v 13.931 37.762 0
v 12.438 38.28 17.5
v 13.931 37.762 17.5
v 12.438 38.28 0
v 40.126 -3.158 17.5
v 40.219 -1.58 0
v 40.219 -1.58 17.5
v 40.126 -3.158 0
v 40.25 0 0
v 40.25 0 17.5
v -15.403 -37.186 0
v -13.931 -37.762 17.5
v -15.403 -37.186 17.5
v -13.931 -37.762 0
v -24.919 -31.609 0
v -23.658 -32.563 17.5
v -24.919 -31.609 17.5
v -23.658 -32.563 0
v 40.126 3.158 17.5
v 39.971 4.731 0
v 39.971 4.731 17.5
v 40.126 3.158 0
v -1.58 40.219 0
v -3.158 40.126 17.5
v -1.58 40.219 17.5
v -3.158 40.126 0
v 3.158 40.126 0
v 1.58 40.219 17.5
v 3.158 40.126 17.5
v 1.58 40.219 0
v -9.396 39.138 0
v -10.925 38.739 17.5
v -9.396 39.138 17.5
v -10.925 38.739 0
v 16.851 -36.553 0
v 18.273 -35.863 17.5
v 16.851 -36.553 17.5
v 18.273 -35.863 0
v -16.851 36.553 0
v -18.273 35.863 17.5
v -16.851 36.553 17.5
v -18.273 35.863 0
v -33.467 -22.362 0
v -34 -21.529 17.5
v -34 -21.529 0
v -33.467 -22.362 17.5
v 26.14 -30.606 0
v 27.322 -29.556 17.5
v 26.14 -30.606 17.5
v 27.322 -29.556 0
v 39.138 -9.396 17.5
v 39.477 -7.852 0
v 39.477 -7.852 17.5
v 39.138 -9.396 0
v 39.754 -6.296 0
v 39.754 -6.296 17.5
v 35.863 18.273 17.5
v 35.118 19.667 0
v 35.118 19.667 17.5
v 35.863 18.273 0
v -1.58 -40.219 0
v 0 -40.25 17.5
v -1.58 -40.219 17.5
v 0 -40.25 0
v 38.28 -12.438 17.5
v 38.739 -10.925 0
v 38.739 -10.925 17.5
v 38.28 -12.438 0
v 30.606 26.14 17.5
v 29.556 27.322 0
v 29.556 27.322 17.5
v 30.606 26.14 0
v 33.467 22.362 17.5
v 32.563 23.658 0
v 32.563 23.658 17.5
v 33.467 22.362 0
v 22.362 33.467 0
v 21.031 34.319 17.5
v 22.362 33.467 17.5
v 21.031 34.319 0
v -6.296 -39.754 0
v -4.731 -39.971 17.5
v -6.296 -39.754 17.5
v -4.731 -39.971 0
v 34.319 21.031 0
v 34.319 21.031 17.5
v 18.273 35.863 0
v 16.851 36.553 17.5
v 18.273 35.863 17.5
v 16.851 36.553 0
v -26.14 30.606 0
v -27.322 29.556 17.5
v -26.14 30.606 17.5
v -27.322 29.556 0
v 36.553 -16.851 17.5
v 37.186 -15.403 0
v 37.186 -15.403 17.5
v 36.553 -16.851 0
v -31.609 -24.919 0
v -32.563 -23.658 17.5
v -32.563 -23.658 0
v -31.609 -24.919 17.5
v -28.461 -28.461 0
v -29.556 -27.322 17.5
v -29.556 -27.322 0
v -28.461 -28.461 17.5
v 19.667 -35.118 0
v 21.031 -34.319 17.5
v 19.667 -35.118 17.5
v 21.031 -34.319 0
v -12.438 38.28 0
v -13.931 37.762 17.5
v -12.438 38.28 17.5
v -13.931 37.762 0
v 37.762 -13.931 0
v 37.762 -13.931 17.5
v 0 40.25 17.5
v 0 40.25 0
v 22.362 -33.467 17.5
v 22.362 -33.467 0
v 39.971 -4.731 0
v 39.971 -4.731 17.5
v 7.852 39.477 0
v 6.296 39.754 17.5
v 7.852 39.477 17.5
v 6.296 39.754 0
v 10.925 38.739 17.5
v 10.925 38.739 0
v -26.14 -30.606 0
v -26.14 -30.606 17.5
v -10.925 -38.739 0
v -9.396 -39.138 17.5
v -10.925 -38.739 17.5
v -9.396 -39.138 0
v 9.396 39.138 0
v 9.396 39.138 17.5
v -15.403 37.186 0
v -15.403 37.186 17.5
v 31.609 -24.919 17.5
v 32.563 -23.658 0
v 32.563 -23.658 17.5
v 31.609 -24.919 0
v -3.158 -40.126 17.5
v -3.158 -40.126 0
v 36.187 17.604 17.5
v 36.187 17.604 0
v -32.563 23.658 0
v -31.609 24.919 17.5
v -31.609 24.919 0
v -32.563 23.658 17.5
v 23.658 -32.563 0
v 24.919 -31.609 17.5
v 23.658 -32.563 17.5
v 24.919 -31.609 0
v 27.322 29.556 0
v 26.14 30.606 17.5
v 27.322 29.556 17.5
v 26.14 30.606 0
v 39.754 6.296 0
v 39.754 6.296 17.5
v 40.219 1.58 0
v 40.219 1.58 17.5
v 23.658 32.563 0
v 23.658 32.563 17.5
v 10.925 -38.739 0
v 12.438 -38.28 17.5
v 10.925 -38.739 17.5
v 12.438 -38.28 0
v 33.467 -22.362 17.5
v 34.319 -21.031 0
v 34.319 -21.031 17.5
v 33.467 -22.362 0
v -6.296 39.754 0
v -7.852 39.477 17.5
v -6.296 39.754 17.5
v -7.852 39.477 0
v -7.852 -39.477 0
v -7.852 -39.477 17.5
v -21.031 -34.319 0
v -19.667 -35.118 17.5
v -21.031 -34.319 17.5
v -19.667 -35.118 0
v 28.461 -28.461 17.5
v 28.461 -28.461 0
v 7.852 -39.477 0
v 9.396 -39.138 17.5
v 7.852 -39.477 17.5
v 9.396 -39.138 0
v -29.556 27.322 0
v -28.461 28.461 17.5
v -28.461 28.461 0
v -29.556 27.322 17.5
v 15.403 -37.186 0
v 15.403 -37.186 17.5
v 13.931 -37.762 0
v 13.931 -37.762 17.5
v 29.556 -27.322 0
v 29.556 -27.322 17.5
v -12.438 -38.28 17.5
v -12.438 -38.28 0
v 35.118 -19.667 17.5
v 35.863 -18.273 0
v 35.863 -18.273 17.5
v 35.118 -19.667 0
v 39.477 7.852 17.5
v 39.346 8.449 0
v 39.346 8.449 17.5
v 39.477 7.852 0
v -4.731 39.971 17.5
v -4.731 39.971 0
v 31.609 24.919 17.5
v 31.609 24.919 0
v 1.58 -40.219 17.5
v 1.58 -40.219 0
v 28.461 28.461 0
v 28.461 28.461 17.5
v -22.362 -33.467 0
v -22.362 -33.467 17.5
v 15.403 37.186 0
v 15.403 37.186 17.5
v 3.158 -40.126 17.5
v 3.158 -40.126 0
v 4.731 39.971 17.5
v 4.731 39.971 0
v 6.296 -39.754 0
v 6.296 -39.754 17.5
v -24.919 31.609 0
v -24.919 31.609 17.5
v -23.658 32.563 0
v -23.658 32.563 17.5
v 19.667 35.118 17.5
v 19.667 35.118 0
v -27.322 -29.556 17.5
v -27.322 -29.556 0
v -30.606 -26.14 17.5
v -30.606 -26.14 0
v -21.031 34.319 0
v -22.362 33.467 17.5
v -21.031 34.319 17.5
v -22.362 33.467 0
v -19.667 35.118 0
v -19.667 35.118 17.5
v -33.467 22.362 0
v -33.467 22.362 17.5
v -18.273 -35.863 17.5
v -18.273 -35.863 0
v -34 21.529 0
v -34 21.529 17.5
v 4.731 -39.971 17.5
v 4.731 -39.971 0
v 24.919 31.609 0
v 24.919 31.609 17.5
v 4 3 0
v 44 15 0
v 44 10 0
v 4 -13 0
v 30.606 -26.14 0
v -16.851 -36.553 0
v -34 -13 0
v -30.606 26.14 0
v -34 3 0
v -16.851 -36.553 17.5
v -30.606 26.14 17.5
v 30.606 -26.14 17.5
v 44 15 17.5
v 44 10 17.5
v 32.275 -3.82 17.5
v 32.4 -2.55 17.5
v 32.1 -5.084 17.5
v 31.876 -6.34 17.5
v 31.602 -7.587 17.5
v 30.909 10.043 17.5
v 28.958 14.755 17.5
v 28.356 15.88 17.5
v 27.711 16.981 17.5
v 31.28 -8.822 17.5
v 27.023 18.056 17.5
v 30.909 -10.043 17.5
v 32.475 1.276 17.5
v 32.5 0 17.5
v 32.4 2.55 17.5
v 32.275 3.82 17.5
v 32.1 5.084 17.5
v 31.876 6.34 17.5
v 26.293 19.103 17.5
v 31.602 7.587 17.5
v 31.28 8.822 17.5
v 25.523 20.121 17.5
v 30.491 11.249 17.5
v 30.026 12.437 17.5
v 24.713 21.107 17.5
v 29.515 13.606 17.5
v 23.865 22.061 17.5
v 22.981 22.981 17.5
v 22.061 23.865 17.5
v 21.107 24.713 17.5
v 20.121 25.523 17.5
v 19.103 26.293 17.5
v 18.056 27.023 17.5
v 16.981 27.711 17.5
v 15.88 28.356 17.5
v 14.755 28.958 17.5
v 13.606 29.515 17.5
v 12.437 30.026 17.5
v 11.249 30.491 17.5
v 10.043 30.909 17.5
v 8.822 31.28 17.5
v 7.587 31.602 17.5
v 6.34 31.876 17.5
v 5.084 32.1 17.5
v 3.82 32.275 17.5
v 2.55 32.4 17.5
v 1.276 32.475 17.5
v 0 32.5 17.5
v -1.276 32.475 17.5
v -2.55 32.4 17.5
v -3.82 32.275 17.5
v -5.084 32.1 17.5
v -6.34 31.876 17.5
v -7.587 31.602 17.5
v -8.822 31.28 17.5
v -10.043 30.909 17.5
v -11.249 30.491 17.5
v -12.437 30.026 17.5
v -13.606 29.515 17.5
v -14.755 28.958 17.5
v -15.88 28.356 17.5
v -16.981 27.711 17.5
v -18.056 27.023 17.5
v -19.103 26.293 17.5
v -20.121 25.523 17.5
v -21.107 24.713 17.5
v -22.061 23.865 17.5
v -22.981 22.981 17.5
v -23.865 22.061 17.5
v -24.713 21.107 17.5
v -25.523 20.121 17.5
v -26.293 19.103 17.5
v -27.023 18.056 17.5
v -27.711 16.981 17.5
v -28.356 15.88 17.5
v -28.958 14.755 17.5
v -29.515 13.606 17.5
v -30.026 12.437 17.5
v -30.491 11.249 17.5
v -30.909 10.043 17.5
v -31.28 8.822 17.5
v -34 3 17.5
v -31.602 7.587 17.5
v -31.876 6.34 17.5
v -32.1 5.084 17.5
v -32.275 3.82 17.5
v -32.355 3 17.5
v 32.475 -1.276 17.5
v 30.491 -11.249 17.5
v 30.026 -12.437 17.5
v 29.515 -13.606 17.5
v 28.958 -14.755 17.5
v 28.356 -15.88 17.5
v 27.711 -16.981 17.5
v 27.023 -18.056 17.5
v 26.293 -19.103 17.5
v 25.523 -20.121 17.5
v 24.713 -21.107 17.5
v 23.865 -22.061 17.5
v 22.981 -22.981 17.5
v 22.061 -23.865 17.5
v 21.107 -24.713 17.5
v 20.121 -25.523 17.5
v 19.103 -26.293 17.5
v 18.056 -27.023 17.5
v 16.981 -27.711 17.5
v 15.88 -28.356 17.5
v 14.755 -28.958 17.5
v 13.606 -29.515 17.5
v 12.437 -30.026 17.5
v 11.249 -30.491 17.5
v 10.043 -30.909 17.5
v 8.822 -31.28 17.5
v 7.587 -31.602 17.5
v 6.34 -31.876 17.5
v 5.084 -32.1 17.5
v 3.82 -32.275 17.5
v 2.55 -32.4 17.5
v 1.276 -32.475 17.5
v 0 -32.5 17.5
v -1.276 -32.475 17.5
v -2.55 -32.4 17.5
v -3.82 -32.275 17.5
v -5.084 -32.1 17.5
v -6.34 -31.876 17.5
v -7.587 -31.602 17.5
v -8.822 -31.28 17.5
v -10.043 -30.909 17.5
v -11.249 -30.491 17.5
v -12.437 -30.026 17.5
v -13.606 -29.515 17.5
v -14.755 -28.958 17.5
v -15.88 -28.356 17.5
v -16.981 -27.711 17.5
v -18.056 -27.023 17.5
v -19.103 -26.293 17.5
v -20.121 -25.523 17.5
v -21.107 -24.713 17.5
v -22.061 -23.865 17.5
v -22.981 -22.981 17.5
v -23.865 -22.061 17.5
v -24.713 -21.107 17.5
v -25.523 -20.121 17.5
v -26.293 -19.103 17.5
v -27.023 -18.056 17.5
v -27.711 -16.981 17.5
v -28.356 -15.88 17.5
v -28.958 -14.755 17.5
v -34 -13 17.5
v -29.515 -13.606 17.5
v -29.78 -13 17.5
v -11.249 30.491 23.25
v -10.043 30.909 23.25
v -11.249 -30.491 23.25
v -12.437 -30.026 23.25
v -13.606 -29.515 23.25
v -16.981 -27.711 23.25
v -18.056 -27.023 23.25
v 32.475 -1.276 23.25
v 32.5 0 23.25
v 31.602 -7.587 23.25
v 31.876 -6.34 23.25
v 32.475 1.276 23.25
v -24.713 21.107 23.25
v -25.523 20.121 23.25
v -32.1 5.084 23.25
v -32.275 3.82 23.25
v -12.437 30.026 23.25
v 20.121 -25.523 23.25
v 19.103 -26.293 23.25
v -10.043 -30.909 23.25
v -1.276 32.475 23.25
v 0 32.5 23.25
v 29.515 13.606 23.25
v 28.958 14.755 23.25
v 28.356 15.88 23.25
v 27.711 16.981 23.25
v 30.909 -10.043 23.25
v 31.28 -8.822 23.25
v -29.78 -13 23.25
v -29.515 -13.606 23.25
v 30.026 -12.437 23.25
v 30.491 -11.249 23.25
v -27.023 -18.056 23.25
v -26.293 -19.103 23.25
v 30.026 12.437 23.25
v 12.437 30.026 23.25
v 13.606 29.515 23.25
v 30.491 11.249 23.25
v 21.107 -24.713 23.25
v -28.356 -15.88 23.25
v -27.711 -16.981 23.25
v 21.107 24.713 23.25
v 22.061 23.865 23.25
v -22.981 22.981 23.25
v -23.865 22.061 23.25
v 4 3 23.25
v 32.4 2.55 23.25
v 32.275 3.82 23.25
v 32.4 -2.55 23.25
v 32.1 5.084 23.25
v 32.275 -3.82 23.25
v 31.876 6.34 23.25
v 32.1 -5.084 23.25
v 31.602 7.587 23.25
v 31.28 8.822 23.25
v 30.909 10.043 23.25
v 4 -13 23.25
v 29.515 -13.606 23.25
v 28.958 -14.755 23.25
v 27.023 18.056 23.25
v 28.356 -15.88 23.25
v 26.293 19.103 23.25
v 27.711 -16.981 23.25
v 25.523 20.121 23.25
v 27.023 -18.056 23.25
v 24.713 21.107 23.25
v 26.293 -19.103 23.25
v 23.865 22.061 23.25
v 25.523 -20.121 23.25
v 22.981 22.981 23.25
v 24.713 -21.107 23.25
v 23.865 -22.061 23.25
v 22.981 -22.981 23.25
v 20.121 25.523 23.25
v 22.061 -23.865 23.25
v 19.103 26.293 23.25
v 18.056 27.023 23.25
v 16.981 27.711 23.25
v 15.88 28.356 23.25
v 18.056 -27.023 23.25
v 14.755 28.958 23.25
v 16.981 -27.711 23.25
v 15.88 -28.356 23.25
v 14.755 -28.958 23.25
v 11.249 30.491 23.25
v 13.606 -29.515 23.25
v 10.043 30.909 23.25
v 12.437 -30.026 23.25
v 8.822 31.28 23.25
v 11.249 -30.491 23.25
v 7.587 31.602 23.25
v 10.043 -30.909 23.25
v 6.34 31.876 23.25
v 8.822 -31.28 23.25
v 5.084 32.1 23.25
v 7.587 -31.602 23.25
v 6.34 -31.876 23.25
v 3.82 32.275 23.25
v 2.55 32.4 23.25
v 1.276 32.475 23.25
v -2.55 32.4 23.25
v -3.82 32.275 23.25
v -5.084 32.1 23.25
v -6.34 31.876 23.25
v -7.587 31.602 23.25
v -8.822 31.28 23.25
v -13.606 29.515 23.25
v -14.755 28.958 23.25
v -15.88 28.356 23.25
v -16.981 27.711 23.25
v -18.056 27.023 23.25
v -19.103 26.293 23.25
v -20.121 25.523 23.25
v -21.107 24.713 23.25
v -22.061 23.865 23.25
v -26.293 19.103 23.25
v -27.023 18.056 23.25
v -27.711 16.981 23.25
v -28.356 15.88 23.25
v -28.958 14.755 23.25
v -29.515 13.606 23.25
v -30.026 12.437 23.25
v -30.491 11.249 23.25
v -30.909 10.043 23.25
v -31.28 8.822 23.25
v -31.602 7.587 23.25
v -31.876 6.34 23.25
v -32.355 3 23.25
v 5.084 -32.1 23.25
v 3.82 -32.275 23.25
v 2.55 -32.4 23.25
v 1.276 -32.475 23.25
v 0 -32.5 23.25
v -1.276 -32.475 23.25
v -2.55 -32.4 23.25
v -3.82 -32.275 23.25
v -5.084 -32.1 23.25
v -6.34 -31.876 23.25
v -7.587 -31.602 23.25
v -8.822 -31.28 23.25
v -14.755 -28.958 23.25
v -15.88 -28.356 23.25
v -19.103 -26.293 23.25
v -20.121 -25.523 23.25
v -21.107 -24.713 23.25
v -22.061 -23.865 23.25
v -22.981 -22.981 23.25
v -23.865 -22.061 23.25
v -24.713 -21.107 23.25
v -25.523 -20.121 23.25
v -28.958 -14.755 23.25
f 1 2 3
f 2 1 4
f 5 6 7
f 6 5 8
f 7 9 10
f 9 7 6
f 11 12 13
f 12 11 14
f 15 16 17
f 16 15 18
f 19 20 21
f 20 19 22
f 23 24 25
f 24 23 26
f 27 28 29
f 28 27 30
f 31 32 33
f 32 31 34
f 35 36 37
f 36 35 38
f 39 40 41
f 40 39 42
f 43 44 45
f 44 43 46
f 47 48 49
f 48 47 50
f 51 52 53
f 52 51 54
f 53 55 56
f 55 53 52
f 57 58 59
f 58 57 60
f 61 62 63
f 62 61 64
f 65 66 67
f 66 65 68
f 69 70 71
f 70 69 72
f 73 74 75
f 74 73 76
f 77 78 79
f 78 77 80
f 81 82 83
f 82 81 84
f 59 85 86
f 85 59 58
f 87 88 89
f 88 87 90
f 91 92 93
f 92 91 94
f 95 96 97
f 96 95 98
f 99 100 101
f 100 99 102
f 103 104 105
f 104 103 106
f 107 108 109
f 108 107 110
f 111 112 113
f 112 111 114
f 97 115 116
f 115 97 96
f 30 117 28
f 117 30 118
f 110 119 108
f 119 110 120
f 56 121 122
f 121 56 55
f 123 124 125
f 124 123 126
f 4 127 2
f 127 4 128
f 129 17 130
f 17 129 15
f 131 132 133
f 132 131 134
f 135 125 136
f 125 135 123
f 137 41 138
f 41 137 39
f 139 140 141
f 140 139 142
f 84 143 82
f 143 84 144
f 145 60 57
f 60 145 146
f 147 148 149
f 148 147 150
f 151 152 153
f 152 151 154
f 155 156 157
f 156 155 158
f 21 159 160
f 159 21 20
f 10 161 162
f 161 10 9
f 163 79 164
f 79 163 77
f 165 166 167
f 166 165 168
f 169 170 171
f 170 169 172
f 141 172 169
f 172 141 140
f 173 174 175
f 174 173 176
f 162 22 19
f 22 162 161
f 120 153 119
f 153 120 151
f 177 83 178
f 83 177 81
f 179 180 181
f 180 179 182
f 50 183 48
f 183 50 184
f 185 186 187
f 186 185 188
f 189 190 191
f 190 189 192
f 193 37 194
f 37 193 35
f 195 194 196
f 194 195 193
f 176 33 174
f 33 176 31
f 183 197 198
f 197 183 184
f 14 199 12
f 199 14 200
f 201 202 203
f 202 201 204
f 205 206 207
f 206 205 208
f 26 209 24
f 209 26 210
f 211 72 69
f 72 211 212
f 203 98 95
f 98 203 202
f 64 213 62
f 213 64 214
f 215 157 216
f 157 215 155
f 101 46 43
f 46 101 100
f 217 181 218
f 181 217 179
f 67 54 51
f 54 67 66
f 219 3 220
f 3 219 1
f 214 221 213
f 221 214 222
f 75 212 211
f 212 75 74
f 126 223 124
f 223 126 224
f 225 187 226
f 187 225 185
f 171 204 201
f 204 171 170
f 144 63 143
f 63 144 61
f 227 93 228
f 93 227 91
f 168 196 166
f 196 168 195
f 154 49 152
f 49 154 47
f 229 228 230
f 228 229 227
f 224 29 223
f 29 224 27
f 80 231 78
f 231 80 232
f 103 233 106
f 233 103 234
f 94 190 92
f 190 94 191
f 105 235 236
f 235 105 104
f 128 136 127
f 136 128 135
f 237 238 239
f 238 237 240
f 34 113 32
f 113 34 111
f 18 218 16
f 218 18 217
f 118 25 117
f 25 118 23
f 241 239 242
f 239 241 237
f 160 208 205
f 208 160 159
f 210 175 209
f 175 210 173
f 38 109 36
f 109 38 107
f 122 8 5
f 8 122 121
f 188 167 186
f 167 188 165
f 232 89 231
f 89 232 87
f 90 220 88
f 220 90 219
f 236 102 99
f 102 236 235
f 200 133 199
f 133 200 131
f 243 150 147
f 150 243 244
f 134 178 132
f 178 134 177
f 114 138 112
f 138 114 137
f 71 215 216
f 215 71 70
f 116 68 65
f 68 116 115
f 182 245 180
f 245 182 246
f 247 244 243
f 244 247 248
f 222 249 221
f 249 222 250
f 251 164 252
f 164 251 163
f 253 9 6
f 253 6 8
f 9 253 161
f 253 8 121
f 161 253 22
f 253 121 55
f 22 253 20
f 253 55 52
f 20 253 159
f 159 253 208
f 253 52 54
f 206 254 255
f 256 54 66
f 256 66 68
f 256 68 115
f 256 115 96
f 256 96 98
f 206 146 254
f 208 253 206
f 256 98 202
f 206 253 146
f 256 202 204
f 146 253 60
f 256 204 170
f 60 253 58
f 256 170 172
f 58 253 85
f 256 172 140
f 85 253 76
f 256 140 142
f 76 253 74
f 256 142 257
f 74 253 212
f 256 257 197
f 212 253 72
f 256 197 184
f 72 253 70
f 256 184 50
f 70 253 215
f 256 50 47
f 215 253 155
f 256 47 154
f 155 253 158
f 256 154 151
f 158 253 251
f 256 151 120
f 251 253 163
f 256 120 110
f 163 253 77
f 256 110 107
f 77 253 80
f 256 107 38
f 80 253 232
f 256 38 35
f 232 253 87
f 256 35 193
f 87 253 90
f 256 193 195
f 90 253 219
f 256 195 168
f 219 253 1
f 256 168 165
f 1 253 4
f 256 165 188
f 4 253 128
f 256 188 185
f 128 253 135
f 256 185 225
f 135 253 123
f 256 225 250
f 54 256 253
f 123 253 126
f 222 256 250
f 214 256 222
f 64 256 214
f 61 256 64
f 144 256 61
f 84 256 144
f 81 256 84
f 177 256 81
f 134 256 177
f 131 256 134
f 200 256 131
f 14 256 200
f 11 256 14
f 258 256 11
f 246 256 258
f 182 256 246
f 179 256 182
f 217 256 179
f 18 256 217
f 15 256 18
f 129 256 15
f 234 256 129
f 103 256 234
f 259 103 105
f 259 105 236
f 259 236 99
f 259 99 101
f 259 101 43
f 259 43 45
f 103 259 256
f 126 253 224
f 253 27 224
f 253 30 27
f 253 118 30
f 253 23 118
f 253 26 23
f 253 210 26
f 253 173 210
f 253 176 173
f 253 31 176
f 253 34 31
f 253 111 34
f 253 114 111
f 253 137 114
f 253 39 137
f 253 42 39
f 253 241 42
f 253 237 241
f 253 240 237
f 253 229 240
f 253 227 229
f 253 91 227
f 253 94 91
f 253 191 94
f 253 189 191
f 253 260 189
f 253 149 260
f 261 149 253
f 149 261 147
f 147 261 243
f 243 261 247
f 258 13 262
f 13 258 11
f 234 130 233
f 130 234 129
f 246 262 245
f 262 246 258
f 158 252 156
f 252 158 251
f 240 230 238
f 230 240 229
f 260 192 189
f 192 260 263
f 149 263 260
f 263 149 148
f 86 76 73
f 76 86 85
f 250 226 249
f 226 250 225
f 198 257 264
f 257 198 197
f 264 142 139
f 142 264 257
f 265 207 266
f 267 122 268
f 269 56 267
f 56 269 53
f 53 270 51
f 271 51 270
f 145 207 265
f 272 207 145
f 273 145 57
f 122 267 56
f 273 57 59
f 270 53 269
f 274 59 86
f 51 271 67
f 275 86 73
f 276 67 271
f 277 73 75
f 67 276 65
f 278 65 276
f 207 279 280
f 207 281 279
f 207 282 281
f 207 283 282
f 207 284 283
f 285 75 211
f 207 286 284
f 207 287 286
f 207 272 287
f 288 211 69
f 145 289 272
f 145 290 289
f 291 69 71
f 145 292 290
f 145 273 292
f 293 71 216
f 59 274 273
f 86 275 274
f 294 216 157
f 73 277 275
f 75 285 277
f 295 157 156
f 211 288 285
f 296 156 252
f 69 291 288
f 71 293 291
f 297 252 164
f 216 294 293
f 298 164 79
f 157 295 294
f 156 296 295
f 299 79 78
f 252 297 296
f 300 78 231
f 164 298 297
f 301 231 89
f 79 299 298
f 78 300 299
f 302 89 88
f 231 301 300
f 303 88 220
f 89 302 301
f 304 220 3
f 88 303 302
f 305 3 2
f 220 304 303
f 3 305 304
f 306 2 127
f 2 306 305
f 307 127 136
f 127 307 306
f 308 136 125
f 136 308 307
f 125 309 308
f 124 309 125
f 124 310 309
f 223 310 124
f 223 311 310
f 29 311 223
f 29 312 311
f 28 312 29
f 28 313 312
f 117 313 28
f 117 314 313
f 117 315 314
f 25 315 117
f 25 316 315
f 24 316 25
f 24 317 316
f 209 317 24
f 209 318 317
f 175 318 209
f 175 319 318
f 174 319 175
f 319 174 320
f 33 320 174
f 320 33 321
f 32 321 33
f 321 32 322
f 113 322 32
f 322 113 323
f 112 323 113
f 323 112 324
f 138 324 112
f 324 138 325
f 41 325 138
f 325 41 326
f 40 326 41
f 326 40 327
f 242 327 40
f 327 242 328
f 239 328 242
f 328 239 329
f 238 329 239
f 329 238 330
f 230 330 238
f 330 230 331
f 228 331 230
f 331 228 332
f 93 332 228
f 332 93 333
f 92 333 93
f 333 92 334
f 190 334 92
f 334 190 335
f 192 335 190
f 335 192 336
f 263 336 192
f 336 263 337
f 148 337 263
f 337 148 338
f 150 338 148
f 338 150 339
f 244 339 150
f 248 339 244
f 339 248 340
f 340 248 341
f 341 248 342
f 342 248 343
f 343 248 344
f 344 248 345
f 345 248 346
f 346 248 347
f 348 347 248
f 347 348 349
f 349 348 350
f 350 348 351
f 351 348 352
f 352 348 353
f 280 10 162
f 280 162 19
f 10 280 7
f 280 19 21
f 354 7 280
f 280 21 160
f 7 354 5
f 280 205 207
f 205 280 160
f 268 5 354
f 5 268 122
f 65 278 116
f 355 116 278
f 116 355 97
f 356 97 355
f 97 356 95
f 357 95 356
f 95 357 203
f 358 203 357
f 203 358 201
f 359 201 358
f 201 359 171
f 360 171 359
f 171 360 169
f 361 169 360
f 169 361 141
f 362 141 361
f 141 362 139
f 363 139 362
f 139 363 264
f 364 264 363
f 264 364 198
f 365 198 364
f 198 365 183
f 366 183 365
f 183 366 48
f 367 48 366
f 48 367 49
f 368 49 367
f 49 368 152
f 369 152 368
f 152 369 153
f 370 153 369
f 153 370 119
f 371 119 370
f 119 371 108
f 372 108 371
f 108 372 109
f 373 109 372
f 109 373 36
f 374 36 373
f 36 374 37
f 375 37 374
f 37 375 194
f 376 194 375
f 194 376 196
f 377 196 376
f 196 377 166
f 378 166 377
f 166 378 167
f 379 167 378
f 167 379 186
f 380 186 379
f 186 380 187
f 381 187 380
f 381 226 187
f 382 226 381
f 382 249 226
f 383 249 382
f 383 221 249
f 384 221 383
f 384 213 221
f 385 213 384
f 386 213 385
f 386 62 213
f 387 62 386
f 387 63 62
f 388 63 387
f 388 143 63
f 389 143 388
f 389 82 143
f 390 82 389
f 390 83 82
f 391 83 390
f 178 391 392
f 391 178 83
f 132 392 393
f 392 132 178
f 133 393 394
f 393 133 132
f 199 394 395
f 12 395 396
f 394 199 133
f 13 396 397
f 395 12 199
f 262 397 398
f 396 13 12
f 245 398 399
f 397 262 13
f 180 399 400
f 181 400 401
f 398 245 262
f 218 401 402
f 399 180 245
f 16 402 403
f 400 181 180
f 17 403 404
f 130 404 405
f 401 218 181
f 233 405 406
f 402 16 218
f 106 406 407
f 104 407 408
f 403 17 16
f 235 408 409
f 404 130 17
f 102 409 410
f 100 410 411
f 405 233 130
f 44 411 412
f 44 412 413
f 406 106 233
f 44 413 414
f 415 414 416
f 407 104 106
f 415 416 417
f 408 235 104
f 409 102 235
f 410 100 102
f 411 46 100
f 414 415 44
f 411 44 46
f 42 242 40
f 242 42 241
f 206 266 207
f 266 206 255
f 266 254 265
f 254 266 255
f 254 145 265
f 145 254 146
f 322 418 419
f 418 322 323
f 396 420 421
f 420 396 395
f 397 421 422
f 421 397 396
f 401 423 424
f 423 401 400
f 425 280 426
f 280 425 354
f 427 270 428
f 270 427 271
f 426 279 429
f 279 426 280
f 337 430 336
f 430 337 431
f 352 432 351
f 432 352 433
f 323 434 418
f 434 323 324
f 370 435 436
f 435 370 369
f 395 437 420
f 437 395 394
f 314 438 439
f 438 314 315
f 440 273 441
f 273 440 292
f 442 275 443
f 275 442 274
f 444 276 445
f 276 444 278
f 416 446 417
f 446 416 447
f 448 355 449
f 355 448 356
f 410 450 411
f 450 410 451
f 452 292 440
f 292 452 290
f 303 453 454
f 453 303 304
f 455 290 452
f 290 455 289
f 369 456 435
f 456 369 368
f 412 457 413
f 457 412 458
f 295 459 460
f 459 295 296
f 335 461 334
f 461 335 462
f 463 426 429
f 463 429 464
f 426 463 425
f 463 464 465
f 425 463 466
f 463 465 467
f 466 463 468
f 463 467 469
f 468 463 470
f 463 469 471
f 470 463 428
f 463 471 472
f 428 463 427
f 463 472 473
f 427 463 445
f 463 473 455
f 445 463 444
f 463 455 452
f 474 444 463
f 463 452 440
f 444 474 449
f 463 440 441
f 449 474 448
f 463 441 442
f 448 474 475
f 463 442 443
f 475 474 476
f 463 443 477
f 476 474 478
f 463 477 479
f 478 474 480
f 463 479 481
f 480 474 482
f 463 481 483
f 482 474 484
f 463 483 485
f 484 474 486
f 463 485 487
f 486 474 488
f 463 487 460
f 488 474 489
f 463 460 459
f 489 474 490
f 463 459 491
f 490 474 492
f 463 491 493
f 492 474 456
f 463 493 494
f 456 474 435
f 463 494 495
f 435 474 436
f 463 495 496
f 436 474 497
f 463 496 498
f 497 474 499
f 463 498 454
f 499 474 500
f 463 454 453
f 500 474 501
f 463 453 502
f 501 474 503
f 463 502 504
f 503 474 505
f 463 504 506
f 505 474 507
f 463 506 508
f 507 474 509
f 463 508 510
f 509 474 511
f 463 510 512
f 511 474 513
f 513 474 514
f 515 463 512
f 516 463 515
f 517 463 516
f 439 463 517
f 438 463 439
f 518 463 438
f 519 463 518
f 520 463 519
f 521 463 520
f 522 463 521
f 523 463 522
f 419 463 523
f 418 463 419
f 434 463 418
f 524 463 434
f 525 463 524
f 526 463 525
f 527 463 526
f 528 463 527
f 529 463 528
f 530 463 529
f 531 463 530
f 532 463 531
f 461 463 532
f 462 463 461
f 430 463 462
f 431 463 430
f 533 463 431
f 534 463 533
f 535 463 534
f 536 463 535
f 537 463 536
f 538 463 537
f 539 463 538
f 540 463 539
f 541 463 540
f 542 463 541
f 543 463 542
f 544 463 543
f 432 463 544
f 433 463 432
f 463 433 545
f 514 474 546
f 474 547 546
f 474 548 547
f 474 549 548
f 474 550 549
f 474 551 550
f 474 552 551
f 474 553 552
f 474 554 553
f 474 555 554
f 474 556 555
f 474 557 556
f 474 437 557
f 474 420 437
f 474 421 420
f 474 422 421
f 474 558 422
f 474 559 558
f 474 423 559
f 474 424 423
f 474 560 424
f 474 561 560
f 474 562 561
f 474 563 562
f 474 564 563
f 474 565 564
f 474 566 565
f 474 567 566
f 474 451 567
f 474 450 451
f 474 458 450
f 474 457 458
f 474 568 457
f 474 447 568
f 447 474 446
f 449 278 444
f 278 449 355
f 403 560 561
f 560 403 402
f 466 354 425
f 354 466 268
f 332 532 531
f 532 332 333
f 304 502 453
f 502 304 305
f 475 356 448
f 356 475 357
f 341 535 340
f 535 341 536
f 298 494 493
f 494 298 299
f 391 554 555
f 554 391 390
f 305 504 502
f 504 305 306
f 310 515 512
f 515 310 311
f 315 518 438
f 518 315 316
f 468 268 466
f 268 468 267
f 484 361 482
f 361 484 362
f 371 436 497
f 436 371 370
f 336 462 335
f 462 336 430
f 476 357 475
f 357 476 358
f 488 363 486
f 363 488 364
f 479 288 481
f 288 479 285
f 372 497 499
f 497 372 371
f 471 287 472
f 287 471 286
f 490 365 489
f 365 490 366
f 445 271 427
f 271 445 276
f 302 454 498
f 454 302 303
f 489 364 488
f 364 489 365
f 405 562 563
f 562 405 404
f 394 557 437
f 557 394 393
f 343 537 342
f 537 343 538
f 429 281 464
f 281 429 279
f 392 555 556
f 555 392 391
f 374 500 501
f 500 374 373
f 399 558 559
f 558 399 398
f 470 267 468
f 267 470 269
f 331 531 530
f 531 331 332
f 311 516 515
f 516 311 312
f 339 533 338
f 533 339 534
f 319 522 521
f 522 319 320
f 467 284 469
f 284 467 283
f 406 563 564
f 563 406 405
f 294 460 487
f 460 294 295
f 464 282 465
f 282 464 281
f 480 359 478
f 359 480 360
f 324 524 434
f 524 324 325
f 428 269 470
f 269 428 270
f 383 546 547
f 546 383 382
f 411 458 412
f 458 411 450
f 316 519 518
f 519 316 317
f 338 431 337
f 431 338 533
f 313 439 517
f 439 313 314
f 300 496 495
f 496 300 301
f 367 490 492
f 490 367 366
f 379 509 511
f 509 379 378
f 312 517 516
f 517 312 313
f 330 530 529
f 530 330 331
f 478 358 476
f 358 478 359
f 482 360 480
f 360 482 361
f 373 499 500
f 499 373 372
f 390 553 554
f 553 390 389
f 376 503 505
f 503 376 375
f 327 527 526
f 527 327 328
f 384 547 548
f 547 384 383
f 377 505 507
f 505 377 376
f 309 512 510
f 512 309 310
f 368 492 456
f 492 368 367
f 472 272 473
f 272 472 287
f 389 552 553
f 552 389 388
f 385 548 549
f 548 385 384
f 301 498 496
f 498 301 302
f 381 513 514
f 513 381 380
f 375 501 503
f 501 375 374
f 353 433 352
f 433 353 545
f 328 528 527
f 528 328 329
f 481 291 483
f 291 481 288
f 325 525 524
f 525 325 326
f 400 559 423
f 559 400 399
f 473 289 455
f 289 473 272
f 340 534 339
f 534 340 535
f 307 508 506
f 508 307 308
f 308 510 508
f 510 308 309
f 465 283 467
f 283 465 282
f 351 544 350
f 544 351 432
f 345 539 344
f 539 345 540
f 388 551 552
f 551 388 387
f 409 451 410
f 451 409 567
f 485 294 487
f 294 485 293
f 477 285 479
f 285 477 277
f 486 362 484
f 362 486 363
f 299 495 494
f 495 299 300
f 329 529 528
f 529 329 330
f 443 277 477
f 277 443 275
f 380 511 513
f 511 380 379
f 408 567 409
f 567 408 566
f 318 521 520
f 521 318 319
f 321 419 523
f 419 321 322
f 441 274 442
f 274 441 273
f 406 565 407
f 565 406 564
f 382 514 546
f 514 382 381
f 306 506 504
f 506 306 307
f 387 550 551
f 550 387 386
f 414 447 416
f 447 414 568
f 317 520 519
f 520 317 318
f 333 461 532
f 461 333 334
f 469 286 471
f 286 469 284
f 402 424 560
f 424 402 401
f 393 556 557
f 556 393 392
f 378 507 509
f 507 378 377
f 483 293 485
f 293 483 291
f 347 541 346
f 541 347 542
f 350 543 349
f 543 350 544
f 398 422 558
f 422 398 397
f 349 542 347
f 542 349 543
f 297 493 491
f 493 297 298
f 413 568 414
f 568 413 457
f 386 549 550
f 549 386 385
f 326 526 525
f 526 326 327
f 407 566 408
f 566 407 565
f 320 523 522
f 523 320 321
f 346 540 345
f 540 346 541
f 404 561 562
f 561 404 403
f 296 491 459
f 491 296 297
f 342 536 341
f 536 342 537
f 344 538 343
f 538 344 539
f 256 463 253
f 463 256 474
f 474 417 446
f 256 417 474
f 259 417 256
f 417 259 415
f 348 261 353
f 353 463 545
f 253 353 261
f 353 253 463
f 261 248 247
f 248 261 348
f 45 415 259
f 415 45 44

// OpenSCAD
/* jumpmaster-bin.scad
 *
 * Copyright (C) Robert B. Ross, 2016
 *
 * This software is released under the Creative Commons
 * Attribution-ShareAlike 4.0 International Public License.
 */


include <./bintools.scad>

$fn=160;
binHeight=46.5/2;

/* locations is a pair of triples, translate : rotate pairs
 */
locations = [[[-5,-12.5,0], [0,0,2]]];

if (0) {
   intersection() {
      hull() harborFreightLargeHalfHt();
      harborFreightLargeHalfHt(locations,inset=0.5) intersection() {
         jumpmasterBlank();
      }
   }
}
else {
   jumpmasterBlank();
}

/* jumpmasterOutline() -- test piece for outline
 */
module jumpmasterOutline() {
   translate([0,0,10]) rotate([180,0,0]) {
      blankCutout(height=20, outlineScale=1.2) jumpmasterBlank();
   }
}

module jumpmasterBlank() {
   blankHeight = binHeight; /* was 32 */
   
   rotate([180,0,0]) translate([0,0,-blankHeight]) union() {
      jumpmasterBody();
   } /* rotate, translate, union */
}

/* jumpmasterBody()
 *
 * Notes:
 */
module jumpmasterBody() {
   difference() {
      union() {
         /* main body */
         translate([0,0,binHeight-17.5]) cylinder(r=80.5/2,h=17.5);

         /* cockpit, etc. */
         translate([29,-20,binHeight-17.5]) {
            linear_extrude(height=17.5)
               polygon(points=[[0,0], [15,5], [15,10], [0,15]]);
         }
         /* cutouts */
         translate([0,0,0]) cylinder(r=79/2-7,h=binHeight); /* interior */
         }

      /* difference out */
      translate([-60,-3,-0.5]) cube([64,16,binHeight+1]);
      translate([-54,-35,-0.5]) cube([20,70,binHeight+1]);
   }
}

/*
 * Local variables:
 *  mode: C
 *  c-indent-level: 3
 *  c-basic-offset: 3
 * End:
 *
 * vim: ts=8 sts=3 sw=3 expandtab
 */
